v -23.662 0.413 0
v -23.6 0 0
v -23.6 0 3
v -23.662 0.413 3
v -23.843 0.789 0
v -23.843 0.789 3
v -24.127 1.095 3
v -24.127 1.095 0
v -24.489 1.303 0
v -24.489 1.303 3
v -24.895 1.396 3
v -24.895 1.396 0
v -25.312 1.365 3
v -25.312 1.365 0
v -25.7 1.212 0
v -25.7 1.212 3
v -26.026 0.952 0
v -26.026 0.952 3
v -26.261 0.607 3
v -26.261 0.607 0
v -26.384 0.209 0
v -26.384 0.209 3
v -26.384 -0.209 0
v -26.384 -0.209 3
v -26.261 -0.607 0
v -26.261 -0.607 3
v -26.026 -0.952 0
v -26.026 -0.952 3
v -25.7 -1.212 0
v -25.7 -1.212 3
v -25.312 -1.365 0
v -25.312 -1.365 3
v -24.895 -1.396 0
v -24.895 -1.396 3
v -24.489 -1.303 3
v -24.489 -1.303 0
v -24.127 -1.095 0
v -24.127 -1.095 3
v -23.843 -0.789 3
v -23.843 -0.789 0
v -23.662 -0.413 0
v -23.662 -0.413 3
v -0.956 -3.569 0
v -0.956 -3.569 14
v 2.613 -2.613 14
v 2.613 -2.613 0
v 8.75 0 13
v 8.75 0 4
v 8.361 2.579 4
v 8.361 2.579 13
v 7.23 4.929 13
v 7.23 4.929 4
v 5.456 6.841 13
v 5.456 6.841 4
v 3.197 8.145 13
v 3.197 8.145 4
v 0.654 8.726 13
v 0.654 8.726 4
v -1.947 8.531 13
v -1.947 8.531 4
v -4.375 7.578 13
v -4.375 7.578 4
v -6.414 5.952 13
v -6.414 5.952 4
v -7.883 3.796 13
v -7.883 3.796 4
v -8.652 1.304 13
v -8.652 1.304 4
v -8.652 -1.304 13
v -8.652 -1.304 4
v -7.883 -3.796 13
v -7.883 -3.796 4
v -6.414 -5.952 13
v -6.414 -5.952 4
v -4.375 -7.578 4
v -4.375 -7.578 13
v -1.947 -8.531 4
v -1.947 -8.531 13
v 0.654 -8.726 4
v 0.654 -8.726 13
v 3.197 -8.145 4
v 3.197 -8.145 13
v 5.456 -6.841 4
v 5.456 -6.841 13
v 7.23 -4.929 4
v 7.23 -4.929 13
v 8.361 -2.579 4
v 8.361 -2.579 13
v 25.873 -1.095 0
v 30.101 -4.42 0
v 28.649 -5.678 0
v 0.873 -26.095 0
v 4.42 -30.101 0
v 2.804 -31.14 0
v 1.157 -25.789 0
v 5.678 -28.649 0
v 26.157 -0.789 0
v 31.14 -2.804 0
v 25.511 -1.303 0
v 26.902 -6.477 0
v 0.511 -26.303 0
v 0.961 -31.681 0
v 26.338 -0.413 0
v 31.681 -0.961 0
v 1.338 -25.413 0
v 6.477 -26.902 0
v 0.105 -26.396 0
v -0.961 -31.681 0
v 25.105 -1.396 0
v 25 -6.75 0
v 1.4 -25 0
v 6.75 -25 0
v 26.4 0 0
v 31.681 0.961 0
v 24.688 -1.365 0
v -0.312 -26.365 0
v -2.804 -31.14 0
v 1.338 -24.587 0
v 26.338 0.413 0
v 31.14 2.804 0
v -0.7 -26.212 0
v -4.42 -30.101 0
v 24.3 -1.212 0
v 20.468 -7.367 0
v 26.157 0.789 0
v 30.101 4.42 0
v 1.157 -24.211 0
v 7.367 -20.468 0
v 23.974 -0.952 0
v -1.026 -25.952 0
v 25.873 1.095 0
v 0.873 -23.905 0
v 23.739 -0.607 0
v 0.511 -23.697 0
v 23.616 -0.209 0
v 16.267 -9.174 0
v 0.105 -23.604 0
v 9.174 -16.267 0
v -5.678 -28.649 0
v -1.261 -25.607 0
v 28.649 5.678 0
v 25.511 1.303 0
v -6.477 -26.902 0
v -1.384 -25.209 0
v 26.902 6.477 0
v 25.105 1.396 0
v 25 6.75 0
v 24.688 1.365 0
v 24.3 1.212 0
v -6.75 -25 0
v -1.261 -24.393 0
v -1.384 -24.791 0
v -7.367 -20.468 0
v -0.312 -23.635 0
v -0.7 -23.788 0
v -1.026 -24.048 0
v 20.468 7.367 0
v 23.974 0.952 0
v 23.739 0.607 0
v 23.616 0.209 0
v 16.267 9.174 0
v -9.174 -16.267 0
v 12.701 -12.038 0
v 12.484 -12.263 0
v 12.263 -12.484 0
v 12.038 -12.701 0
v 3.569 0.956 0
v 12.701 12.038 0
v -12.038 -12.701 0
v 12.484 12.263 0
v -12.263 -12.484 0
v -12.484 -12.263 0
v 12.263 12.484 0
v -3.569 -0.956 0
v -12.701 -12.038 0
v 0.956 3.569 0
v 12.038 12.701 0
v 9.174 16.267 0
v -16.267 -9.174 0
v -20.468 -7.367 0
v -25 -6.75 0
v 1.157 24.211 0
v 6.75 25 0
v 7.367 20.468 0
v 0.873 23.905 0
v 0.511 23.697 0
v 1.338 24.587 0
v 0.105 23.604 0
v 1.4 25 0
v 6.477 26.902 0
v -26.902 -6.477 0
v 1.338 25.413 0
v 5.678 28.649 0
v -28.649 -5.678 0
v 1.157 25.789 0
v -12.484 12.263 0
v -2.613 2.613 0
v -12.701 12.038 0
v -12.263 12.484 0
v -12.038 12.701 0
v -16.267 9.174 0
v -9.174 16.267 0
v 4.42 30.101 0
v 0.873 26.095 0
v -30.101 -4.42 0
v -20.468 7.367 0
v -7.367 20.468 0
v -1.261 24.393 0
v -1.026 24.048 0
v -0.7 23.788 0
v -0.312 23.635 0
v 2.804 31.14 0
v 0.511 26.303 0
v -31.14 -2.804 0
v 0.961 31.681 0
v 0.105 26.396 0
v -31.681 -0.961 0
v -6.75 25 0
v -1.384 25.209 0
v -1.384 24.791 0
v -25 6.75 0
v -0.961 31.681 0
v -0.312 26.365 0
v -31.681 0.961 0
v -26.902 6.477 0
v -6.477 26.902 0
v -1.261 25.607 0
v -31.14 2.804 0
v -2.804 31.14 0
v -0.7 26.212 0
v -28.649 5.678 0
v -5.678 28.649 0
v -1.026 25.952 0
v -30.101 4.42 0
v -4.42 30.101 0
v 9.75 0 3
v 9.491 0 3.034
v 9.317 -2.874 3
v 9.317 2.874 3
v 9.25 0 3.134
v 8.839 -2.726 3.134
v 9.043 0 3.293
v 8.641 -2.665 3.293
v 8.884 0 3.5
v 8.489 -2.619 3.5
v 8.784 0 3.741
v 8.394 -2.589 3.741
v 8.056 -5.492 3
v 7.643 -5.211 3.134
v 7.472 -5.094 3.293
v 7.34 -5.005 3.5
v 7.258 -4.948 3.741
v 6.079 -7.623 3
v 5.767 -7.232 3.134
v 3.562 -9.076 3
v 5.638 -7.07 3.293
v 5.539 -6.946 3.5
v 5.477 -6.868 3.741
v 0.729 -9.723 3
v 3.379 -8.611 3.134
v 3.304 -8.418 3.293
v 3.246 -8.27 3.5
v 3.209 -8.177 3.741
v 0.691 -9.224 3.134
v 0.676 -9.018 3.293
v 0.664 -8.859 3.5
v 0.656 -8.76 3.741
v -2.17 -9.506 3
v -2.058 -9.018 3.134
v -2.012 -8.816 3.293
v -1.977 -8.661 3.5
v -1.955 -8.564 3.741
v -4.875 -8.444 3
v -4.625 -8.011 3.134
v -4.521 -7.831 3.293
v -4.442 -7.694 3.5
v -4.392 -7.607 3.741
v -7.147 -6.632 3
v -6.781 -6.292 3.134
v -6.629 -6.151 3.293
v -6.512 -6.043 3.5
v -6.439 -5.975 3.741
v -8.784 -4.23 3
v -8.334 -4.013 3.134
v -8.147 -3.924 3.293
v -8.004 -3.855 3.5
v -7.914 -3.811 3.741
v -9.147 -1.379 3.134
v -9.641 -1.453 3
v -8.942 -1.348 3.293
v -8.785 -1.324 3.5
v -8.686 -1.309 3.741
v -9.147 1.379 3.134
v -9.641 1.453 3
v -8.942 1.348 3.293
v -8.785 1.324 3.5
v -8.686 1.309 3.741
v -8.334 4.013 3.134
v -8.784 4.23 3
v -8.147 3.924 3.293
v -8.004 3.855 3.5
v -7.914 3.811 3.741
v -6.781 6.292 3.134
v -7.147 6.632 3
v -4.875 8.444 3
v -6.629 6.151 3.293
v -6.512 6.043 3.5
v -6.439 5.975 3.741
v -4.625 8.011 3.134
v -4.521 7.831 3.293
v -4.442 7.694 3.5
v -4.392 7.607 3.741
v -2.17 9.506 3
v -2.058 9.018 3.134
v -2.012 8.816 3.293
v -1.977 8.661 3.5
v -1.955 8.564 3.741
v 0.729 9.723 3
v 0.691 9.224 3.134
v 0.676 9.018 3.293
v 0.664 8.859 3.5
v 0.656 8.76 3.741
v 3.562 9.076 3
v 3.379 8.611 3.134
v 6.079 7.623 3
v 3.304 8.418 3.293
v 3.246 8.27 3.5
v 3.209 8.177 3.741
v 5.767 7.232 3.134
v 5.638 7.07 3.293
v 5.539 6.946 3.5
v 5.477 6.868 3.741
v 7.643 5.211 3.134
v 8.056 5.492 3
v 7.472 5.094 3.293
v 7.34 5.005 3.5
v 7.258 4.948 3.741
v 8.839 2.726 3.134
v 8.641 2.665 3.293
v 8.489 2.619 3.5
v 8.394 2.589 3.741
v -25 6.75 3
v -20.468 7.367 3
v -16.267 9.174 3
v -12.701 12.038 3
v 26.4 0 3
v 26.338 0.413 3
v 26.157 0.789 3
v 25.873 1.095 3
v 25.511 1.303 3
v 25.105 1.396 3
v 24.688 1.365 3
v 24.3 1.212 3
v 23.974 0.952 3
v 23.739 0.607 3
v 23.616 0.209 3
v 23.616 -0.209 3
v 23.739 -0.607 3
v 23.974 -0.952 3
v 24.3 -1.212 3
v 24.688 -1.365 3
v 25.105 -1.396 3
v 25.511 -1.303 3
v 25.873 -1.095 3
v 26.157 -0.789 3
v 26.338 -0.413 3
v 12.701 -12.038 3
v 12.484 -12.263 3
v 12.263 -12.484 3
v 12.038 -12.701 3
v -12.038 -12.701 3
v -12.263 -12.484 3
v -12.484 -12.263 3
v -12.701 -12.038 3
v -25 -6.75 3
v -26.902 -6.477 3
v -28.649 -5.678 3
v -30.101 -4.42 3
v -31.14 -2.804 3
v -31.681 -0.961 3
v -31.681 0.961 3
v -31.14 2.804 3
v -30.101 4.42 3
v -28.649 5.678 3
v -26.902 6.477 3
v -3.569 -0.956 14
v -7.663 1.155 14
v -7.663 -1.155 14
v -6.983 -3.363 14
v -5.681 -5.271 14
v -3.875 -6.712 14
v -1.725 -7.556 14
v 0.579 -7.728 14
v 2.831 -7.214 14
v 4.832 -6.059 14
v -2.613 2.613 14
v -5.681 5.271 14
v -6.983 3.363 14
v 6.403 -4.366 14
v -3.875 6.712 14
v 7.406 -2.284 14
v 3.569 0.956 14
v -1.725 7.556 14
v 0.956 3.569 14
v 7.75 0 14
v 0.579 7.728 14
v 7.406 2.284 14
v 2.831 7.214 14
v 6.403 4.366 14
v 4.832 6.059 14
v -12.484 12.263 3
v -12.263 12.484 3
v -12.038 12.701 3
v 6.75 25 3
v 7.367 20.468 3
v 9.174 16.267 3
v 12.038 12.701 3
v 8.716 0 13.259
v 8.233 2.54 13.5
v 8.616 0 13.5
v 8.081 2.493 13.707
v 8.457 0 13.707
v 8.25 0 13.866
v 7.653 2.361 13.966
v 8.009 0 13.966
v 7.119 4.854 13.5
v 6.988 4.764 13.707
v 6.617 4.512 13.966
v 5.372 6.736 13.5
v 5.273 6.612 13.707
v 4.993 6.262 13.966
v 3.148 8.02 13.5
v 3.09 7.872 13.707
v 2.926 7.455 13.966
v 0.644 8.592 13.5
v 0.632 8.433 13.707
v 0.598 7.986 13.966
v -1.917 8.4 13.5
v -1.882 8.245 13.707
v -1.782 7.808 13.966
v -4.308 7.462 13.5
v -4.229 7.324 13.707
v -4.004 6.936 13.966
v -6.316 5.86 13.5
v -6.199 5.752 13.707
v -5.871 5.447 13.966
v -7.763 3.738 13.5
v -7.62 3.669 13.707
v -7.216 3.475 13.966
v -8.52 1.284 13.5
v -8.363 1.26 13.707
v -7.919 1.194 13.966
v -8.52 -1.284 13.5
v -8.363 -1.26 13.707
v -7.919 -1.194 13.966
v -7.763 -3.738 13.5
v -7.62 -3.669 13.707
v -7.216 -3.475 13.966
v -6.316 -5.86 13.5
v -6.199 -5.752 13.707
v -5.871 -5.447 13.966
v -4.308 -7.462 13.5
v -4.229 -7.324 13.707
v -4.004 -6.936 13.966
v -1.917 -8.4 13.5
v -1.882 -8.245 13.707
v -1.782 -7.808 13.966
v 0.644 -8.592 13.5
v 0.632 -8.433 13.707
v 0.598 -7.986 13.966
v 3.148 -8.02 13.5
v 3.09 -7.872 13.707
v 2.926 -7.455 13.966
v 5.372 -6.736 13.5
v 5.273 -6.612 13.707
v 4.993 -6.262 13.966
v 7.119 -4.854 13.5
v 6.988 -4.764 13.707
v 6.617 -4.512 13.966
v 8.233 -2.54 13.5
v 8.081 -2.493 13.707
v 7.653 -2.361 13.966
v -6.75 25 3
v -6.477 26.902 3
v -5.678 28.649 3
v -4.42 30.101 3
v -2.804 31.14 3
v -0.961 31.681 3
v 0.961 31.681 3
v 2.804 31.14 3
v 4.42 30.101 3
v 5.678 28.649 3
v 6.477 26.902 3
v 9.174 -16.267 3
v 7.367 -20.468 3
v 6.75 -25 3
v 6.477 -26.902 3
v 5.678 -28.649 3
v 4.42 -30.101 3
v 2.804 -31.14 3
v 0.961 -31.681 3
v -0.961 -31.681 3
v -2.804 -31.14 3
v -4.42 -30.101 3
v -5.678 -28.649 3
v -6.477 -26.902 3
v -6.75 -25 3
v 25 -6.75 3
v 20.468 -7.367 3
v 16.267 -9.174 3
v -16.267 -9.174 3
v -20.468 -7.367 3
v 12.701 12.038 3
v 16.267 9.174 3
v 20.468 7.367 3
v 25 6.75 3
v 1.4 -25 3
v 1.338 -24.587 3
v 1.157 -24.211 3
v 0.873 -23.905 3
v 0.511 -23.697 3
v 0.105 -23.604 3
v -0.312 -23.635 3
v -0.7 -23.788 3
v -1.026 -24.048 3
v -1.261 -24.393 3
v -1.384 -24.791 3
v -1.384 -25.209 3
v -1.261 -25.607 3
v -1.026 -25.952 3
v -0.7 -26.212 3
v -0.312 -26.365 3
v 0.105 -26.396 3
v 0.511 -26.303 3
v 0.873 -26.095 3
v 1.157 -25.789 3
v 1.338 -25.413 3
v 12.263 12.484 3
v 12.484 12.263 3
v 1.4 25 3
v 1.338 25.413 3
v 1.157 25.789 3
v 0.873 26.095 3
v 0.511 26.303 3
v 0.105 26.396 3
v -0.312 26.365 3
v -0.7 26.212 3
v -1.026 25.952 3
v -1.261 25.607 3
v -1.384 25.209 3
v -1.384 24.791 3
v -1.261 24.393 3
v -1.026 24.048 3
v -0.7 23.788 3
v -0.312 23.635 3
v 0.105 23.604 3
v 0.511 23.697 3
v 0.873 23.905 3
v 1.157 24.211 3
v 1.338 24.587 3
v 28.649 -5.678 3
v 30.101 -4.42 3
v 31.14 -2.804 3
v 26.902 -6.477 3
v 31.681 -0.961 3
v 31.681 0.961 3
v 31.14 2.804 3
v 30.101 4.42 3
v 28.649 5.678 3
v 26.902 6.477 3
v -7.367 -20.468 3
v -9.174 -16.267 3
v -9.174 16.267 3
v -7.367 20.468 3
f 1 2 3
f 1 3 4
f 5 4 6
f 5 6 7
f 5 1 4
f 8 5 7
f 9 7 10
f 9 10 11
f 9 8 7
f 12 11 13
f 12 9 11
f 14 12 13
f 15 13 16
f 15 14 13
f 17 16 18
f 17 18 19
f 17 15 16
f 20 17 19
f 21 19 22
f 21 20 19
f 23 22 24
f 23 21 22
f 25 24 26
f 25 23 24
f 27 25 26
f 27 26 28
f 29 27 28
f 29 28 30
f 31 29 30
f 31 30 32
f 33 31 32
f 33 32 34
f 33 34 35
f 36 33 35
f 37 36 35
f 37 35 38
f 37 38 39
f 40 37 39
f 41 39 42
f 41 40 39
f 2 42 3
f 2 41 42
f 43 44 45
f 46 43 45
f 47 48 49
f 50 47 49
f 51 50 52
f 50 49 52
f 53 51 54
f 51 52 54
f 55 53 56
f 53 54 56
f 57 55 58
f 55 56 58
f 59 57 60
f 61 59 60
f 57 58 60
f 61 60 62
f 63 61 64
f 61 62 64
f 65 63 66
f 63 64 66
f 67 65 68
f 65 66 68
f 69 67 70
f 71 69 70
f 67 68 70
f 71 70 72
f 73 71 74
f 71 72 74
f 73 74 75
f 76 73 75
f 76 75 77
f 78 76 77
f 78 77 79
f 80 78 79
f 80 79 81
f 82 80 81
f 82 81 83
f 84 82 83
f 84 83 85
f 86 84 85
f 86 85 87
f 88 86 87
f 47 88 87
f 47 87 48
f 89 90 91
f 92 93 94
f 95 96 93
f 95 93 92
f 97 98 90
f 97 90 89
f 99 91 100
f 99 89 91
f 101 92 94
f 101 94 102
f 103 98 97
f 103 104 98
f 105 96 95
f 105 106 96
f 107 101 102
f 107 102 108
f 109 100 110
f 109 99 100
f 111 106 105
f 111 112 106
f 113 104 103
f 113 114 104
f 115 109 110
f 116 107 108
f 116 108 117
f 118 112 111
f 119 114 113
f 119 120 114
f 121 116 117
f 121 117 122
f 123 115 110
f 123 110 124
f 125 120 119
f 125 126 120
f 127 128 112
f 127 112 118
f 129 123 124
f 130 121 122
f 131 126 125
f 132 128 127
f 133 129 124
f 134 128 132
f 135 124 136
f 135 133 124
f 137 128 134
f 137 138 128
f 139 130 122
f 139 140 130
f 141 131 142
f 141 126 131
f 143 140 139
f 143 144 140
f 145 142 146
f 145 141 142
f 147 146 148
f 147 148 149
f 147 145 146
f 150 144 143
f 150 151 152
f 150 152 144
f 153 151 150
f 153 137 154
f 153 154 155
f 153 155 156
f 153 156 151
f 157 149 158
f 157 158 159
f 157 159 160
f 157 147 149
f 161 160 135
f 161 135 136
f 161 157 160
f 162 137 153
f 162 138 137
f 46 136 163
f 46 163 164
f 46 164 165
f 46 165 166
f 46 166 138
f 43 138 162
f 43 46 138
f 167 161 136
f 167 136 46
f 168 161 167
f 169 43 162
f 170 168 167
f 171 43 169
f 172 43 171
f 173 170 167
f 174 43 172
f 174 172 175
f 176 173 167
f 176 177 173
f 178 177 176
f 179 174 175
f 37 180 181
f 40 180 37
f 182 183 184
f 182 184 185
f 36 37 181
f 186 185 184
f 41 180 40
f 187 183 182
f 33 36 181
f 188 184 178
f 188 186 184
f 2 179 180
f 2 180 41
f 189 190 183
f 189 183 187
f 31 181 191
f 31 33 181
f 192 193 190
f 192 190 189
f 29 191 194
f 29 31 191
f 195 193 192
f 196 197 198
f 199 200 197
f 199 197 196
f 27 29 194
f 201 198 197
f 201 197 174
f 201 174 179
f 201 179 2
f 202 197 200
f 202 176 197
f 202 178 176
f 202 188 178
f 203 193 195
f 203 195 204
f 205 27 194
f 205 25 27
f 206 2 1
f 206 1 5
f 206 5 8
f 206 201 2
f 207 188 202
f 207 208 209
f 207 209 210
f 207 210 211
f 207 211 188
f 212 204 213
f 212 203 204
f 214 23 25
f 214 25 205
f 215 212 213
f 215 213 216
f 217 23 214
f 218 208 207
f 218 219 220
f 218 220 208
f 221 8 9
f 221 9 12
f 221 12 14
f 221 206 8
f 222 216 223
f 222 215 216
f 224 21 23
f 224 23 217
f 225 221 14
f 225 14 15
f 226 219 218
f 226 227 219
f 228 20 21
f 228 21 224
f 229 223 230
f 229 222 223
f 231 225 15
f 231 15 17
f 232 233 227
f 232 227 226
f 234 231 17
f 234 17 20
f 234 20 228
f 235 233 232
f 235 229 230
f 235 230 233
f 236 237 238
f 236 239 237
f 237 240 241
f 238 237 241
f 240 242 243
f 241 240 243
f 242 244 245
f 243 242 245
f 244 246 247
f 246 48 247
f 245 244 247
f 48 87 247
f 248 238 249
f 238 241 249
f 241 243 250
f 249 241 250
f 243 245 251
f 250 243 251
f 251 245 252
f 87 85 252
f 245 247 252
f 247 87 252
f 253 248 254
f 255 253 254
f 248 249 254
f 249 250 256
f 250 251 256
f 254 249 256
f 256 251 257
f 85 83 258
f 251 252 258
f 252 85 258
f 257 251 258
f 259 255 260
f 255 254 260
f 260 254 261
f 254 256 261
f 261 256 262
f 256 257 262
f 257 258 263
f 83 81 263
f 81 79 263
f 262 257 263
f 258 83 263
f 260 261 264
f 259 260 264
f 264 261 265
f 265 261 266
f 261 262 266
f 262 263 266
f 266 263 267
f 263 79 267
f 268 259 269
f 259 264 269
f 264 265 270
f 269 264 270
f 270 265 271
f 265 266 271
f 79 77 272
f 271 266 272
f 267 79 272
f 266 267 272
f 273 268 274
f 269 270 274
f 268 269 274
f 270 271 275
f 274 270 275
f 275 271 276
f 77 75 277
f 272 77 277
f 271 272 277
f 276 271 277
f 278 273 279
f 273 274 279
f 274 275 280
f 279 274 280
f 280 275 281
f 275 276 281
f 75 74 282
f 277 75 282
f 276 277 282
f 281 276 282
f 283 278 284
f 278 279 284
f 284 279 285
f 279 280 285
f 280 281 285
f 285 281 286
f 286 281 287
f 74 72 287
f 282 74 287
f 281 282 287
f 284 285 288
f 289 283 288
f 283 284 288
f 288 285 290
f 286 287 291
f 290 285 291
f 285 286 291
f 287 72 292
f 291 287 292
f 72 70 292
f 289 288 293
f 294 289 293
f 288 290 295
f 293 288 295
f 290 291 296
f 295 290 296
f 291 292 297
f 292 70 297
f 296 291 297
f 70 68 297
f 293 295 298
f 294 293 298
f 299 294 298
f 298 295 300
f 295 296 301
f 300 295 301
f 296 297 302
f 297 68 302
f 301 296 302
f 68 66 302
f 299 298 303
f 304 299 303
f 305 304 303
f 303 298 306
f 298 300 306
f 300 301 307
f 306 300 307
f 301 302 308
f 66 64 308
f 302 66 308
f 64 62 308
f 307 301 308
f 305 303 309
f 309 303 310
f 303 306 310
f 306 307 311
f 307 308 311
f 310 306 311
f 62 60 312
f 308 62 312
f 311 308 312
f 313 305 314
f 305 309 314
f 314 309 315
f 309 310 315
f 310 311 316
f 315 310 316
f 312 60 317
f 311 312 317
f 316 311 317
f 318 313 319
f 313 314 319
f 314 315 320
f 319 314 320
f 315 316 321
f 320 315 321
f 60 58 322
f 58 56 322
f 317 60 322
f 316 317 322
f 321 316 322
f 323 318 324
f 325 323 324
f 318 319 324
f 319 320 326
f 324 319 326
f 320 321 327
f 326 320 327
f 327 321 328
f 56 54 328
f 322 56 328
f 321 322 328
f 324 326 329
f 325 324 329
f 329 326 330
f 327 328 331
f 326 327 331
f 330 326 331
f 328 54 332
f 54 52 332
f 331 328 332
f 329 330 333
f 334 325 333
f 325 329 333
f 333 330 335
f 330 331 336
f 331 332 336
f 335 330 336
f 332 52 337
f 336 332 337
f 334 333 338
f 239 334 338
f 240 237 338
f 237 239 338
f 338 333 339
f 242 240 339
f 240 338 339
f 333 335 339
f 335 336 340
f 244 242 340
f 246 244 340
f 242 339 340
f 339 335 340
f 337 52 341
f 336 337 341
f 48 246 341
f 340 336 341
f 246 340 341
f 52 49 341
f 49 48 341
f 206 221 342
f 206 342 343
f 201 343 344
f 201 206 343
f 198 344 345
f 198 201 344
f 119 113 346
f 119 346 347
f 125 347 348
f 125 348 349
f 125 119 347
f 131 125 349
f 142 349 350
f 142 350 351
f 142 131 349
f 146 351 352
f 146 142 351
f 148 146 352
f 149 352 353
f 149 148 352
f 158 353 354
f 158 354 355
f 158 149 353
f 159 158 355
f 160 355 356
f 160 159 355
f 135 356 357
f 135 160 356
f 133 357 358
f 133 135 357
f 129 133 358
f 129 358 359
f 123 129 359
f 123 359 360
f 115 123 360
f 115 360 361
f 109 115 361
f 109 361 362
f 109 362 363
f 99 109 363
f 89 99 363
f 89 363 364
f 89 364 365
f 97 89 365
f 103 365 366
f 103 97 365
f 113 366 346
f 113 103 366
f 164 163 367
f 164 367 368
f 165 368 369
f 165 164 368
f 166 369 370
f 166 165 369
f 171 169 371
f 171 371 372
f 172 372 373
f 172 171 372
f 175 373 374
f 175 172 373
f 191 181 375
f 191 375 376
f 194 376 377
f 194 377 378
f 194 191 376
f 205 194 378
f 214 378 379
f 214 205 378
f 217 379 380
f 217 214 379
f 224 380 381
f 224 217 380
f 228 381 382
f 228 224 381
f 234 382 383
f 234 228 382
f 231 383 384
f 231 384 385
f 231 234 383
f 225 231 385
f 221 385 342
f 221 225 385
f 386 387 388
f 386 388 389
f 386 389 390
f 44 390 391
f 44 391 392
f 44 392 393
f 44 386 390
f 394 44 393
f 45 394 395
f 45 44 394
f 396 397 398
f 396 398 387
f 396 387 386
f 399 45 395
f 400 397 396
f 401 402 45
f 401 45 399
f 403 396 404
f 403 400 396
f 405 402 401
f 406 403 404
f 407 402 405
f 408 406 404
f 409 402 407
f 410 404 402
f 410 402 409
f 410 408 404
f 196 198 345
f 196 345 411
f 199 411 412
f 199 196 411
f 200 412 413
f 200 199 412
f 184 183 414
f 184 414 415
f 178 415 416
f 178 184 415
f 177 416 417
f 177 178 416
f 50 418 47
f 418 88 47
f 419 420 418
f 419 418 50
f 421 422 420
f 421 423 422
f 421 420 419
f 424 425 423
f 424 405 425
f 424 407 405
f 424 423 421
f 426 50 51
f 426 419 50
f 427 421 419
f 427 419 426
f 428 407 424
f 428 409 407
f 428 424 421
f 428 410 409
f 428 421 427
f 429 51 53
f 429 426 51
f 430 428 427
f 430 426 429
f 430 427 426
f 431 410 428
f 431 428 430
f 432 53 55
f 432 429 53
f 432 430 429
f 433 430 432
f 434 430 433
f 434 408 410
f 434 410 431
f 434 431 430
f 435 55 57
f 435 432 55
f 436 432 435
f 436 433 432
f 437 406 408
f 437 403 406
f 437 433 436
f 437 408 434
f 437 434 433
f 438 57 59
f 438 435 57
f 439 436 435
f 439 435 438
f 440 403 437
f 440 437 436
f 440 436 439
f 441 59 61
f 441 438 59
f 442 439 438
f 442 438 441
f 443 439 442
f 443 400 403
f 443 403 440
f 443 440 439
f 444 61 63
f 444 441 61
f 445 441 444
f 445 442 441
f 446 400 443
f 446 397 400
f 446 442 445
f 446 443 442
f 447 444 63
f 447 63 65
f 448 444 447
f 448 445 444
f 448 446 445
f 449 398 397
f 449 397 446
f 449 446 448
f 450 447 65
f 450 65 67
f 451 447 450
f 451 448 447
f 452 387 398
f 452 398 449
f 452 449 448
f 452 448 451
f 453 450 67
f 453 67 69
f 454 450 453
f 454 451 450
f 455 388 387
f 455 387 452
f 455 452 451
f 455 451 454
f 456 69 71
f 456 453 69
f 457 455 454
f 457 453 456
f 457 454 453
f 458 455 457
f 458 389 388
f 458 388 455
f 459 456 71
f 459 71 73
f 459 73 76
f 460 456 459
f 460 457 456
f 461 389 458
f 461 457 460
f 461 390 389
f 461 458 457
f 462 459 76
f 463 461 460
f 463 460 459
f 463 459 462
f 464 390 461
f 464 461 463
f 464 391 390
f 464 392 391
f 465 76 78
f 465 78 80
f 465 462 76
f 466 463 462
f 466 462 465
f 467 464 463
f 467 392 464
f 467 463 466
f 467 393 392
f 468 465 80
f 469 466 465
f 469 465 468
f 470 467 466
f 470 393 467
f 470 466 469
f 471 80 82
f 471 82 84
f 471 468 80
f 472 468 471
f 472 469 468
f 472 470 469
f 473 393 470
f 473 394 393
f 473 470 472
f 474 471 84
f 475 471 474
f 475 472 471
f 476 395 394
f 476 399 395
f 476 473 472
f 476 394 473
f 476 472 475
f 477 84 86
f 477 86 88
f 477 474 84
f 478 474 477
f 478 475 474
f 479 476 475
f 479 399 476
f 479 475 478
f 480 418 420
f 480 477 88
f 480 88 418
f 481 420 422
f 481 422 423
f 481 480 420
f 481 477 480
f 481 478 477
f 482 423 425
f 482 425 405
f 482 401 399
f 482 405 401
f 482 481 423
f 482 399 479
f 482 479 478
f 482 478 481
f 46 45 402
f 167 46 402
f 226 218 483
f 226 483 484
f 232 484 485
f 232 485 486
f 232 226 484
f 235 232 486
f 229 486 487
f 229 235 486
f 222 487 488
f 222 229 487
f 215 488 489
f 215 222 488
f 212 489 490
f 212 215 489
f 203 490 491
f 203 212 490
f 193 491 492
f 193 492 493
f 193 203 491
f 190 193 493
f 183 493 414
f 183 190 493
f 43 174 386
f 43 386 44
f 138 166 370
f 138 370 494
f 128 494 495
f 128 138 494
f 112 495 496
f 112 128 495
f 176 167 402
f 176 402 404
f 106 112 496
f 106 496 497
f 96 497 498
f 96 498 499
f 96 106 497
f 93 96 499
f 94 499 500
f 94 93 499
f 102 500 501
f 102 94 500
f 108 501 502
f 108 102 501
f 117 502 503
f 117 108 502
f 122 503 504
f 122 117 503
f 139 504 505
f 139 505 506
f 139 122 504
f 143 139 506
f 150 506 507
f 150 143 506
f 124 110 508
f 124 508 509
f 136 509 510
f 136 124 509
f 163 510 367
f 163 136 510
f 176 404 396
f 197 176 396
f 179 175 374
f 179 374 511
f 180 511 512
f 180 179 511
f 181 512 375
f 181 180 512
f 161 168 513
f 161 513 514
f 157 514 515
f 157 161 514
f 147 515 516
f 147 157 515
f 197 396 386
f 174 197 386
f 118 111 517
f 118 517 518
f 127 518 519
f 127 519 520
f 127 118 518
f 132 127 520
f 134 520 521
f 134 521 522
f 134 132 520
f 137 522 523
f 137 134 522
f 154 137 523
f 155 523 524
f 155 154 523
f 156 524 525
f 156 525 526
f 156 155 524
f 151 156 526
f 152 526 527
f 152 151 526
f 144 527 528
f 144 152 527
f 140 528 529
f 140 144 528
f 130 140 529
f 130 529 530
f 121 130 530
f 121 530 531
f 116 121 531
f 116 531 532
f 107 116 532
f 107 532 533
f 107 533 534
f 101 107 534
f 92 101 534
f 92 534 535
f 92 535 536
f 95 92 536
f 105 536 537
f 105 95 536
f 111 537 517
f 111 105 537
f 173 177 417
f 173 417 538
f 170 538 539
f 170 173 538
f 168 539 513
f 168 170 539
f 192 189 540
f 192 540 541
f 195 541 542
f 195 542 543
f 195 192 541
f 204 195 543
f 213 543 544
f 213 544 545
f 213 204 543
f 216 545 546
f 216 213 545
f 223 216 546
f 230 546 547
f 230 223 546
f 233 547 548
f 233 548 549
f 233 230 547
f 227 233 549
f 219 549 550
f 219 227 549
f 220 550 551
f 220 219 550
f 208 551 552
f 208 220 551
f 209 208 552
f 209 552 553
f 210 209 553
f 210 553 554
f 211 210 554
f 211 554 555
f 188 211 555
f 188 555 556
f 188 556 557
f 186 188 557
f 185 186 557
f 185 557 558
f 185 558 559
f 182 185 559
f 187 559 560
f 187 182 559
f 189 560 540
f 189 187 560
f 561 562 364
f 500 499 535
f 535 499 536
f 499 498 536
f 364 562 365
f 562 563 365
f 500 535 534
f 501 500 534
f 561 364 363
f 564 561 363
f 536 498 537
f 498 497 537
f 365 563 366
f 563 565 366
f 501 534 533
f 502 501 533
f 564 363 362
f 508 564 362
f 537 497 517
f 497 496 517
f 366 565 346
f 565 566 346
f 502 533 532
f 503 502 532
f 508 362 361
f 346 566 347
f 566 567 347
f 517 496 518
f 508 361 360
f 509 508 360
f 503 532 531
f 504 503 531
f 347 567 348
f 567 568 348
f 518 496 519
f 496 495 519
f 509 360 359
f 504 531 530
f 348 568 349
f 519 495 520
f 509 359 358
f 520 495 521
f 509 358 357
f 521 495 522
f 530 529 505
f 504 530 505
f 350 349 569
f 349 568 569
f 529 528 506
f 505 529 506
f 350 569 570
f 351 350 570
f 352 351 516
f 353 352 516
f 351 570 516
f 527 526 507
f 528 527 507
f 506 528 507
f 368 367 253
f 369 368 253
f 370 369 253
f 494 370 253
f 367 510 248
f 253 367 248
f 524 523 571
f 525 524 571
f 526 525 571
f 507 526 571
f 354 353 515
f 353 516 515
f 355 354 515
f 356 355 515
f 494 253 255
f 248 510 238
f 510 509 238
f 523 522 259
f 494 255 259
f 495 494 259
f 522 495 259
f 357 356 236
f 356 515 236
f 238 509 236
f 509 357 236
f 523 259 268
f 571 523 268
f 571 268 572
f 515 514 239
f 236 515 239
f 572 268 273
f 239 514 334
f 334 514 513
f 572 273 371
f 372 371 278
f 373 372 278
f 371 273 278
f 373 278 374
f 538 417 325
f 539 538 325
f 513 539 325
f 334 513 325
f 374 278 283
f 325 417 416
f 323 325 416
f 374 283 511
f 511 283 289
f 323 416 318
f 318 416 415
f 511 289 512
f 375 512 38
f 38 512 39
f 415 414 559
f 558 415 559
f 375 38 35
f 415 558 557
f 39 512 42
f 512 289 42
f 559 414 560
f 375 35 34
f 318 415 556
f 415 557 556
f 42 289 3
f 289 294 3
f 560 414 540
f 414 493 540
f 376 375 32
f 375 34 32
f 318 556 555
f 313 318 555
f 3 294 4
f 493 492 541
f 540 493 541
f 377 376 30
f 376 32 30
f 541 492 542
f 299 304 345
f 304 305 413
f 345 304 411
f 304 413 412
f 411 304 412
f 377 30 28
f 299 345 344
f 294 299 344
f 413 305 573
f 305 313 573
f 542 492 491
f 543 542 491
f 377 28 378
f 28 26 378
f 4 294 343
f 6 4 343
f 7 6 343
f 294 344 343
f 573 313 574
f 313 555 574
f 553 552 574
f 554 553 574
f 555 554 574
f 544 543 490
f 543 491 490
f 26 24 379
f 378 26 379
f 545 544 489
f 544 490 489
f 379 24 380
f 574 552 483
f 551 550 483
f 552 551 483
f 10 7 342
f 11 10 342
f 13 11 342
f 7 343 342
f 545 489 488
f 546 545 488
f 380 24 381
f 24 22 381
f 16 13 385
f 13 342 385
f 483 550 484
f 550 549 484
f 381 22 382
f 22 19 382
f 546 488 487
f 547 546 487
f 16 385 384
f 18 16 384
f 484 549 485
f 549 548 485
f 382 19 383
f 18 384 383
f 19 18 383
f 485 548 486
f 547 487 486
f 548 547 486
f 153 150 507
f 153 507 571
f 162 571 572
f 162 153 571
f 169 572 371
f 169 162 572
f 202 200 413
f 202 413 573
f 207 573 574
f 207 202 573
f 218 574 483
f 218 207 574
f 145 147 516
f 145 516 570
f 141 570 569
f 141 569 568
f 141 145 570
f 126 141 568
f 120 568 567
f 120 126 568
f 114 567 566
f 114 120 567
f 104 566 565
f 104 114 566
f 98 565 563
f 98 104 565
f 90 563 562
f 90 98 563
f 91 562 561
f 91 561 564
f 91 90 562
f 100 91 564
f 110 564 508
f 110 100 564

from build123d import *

# Parameters (mm, degrees)
SKETCH2_R           = 8.75
BOSS_EXTRUDE1_DEPTH = 14
SKETCH3_R           = 1.4
BOSS_EXTRUDE2_DEPTH = 3
FILLET1_R           = 1
CUT_EXTRUDE2_REACH  = 49.033


with BuildPart() as part:
    # Sketch2 → Boss-Extrude1 (new body)
    with BuildSketch(Plane.XY):
        Circle(SKETCH2_R)
    extrude(amount=BOSS_EXTRUDE1_DEPTH)

    # Sketch3 → Boss-Extrude2 (add)
    with BuildSketch(Plane.XY):
        with BuildLine():
            ThreePointArc((-12.038357667, -12.701493797), (-12.374368671, -12.374368671), (-12.701493797, -12.038357667))
            ThreePointArc((-12.701493797, -12.038357667), (-18.306346632, -8.128131702), (-25, -6.75))
            ThreePointArc((-25, -6.75), (-31.75, 0), (-25, 6.75))
            ThreePointArc((-25, 6.75), (-18.306346632, 8.128131702), (-12.701493797, 12.038357667))
            ThreePointArc((-12.701493797, 12.038357667), (-12.374368671, 12.374368671), (-12.038357667, 12.701493797))
            ThreePointArc((-12.038357667, 12.701493797), (-8.128131702, 18.306346632), (-6.75, 25))
            ThreePointArc((-6.75, 25), (0, 31.75), (6.75, 25))
            ThreePointArc((6.75, 25), (8.128131702, 18.306346632), (12.038357667, 12.701493797))
            ThreePointArc((12.038357667, 12.701493797), (12.374368671, 12.374368671), (12.701493797, 12.038357667))
            ThreePointArc((12.701493797, 12.038357667), (18.306346632, 8.128131702), (25, 6.75))
            ThreePointArc((25, 6.75), (31.75, 0), (25, -6.75))
            ThreePointArc((25, -6.75), (18.306346632, -8.128131702), (12.701493797, -12.038357667))
            ThreePointArc((12.701493797, -12.038357667), (12.374368671, -12.374368671), (12.038357667, -12.701493797))
            ThreePointArc((12.038357667, -12.701493797), (8.128131702, -18.306346632), (6.75, -25))
            ThreePointArc((6.75, -25), (0, -31.75), (-6.75, -25))
            ThreePointArc((-6.75, -25), (-8.128131702, -18.306346632), (-12.038357667, -12.701493797))
        make_face()
        with Locations((25, 0)):
            Circle(SKETCH3_R, mode=Mode.SUBTRACT)
        with Locations((0, -25)):
            Circle(SKETCH3_R, mode=Mode.SUBTRACT)
        with Locations((-25, 0)):
            Circle(SKETCH3_R, mode=Mode.SUBTRACT)
        with Locations((0, 25)):
            Circle(SKETCH3_R, mode=Mode.SUBTRACT)
    extrude(amount=BOSS_EXTRUDE2_DEPTH)

    # Fillet1
    fillet1_edges = [part.edges().sort_by_distance(p)[0] for p in [
        (-8.75, 0, 14),
        (-8.75, 0, 3),
    ]]
    fillet(fillet1_edges, radius=FILLET1_R)

    # Sketch1 → Cut-Extrude2 (cut, up to next)
    with BuildSketch(Plane.XY, mode=Mode.PRIVATE) as cut_extrude2_sk1:
        Polygon((2.612789059, -2.612789059), (3.569136229, 0.95634717), (0.95634717, 3.569136229), (-2.612789059, 2.612789059), (-3.569136229, -0.95634717), (-0.95634717, -3.569136229), align=None)
    cut_extrude2_tool1 = extrude(cut_extrude2_sk1.sketch, amount=CUT_EXTRUDE2_REACH, mode=Mode.PRIVATE) & part.part
    add(cut_extrude2_tool1.solids().sort_by_distance((0, 0, 0))[0], mode=Mode.SUBTRACT)


solid = part.part
